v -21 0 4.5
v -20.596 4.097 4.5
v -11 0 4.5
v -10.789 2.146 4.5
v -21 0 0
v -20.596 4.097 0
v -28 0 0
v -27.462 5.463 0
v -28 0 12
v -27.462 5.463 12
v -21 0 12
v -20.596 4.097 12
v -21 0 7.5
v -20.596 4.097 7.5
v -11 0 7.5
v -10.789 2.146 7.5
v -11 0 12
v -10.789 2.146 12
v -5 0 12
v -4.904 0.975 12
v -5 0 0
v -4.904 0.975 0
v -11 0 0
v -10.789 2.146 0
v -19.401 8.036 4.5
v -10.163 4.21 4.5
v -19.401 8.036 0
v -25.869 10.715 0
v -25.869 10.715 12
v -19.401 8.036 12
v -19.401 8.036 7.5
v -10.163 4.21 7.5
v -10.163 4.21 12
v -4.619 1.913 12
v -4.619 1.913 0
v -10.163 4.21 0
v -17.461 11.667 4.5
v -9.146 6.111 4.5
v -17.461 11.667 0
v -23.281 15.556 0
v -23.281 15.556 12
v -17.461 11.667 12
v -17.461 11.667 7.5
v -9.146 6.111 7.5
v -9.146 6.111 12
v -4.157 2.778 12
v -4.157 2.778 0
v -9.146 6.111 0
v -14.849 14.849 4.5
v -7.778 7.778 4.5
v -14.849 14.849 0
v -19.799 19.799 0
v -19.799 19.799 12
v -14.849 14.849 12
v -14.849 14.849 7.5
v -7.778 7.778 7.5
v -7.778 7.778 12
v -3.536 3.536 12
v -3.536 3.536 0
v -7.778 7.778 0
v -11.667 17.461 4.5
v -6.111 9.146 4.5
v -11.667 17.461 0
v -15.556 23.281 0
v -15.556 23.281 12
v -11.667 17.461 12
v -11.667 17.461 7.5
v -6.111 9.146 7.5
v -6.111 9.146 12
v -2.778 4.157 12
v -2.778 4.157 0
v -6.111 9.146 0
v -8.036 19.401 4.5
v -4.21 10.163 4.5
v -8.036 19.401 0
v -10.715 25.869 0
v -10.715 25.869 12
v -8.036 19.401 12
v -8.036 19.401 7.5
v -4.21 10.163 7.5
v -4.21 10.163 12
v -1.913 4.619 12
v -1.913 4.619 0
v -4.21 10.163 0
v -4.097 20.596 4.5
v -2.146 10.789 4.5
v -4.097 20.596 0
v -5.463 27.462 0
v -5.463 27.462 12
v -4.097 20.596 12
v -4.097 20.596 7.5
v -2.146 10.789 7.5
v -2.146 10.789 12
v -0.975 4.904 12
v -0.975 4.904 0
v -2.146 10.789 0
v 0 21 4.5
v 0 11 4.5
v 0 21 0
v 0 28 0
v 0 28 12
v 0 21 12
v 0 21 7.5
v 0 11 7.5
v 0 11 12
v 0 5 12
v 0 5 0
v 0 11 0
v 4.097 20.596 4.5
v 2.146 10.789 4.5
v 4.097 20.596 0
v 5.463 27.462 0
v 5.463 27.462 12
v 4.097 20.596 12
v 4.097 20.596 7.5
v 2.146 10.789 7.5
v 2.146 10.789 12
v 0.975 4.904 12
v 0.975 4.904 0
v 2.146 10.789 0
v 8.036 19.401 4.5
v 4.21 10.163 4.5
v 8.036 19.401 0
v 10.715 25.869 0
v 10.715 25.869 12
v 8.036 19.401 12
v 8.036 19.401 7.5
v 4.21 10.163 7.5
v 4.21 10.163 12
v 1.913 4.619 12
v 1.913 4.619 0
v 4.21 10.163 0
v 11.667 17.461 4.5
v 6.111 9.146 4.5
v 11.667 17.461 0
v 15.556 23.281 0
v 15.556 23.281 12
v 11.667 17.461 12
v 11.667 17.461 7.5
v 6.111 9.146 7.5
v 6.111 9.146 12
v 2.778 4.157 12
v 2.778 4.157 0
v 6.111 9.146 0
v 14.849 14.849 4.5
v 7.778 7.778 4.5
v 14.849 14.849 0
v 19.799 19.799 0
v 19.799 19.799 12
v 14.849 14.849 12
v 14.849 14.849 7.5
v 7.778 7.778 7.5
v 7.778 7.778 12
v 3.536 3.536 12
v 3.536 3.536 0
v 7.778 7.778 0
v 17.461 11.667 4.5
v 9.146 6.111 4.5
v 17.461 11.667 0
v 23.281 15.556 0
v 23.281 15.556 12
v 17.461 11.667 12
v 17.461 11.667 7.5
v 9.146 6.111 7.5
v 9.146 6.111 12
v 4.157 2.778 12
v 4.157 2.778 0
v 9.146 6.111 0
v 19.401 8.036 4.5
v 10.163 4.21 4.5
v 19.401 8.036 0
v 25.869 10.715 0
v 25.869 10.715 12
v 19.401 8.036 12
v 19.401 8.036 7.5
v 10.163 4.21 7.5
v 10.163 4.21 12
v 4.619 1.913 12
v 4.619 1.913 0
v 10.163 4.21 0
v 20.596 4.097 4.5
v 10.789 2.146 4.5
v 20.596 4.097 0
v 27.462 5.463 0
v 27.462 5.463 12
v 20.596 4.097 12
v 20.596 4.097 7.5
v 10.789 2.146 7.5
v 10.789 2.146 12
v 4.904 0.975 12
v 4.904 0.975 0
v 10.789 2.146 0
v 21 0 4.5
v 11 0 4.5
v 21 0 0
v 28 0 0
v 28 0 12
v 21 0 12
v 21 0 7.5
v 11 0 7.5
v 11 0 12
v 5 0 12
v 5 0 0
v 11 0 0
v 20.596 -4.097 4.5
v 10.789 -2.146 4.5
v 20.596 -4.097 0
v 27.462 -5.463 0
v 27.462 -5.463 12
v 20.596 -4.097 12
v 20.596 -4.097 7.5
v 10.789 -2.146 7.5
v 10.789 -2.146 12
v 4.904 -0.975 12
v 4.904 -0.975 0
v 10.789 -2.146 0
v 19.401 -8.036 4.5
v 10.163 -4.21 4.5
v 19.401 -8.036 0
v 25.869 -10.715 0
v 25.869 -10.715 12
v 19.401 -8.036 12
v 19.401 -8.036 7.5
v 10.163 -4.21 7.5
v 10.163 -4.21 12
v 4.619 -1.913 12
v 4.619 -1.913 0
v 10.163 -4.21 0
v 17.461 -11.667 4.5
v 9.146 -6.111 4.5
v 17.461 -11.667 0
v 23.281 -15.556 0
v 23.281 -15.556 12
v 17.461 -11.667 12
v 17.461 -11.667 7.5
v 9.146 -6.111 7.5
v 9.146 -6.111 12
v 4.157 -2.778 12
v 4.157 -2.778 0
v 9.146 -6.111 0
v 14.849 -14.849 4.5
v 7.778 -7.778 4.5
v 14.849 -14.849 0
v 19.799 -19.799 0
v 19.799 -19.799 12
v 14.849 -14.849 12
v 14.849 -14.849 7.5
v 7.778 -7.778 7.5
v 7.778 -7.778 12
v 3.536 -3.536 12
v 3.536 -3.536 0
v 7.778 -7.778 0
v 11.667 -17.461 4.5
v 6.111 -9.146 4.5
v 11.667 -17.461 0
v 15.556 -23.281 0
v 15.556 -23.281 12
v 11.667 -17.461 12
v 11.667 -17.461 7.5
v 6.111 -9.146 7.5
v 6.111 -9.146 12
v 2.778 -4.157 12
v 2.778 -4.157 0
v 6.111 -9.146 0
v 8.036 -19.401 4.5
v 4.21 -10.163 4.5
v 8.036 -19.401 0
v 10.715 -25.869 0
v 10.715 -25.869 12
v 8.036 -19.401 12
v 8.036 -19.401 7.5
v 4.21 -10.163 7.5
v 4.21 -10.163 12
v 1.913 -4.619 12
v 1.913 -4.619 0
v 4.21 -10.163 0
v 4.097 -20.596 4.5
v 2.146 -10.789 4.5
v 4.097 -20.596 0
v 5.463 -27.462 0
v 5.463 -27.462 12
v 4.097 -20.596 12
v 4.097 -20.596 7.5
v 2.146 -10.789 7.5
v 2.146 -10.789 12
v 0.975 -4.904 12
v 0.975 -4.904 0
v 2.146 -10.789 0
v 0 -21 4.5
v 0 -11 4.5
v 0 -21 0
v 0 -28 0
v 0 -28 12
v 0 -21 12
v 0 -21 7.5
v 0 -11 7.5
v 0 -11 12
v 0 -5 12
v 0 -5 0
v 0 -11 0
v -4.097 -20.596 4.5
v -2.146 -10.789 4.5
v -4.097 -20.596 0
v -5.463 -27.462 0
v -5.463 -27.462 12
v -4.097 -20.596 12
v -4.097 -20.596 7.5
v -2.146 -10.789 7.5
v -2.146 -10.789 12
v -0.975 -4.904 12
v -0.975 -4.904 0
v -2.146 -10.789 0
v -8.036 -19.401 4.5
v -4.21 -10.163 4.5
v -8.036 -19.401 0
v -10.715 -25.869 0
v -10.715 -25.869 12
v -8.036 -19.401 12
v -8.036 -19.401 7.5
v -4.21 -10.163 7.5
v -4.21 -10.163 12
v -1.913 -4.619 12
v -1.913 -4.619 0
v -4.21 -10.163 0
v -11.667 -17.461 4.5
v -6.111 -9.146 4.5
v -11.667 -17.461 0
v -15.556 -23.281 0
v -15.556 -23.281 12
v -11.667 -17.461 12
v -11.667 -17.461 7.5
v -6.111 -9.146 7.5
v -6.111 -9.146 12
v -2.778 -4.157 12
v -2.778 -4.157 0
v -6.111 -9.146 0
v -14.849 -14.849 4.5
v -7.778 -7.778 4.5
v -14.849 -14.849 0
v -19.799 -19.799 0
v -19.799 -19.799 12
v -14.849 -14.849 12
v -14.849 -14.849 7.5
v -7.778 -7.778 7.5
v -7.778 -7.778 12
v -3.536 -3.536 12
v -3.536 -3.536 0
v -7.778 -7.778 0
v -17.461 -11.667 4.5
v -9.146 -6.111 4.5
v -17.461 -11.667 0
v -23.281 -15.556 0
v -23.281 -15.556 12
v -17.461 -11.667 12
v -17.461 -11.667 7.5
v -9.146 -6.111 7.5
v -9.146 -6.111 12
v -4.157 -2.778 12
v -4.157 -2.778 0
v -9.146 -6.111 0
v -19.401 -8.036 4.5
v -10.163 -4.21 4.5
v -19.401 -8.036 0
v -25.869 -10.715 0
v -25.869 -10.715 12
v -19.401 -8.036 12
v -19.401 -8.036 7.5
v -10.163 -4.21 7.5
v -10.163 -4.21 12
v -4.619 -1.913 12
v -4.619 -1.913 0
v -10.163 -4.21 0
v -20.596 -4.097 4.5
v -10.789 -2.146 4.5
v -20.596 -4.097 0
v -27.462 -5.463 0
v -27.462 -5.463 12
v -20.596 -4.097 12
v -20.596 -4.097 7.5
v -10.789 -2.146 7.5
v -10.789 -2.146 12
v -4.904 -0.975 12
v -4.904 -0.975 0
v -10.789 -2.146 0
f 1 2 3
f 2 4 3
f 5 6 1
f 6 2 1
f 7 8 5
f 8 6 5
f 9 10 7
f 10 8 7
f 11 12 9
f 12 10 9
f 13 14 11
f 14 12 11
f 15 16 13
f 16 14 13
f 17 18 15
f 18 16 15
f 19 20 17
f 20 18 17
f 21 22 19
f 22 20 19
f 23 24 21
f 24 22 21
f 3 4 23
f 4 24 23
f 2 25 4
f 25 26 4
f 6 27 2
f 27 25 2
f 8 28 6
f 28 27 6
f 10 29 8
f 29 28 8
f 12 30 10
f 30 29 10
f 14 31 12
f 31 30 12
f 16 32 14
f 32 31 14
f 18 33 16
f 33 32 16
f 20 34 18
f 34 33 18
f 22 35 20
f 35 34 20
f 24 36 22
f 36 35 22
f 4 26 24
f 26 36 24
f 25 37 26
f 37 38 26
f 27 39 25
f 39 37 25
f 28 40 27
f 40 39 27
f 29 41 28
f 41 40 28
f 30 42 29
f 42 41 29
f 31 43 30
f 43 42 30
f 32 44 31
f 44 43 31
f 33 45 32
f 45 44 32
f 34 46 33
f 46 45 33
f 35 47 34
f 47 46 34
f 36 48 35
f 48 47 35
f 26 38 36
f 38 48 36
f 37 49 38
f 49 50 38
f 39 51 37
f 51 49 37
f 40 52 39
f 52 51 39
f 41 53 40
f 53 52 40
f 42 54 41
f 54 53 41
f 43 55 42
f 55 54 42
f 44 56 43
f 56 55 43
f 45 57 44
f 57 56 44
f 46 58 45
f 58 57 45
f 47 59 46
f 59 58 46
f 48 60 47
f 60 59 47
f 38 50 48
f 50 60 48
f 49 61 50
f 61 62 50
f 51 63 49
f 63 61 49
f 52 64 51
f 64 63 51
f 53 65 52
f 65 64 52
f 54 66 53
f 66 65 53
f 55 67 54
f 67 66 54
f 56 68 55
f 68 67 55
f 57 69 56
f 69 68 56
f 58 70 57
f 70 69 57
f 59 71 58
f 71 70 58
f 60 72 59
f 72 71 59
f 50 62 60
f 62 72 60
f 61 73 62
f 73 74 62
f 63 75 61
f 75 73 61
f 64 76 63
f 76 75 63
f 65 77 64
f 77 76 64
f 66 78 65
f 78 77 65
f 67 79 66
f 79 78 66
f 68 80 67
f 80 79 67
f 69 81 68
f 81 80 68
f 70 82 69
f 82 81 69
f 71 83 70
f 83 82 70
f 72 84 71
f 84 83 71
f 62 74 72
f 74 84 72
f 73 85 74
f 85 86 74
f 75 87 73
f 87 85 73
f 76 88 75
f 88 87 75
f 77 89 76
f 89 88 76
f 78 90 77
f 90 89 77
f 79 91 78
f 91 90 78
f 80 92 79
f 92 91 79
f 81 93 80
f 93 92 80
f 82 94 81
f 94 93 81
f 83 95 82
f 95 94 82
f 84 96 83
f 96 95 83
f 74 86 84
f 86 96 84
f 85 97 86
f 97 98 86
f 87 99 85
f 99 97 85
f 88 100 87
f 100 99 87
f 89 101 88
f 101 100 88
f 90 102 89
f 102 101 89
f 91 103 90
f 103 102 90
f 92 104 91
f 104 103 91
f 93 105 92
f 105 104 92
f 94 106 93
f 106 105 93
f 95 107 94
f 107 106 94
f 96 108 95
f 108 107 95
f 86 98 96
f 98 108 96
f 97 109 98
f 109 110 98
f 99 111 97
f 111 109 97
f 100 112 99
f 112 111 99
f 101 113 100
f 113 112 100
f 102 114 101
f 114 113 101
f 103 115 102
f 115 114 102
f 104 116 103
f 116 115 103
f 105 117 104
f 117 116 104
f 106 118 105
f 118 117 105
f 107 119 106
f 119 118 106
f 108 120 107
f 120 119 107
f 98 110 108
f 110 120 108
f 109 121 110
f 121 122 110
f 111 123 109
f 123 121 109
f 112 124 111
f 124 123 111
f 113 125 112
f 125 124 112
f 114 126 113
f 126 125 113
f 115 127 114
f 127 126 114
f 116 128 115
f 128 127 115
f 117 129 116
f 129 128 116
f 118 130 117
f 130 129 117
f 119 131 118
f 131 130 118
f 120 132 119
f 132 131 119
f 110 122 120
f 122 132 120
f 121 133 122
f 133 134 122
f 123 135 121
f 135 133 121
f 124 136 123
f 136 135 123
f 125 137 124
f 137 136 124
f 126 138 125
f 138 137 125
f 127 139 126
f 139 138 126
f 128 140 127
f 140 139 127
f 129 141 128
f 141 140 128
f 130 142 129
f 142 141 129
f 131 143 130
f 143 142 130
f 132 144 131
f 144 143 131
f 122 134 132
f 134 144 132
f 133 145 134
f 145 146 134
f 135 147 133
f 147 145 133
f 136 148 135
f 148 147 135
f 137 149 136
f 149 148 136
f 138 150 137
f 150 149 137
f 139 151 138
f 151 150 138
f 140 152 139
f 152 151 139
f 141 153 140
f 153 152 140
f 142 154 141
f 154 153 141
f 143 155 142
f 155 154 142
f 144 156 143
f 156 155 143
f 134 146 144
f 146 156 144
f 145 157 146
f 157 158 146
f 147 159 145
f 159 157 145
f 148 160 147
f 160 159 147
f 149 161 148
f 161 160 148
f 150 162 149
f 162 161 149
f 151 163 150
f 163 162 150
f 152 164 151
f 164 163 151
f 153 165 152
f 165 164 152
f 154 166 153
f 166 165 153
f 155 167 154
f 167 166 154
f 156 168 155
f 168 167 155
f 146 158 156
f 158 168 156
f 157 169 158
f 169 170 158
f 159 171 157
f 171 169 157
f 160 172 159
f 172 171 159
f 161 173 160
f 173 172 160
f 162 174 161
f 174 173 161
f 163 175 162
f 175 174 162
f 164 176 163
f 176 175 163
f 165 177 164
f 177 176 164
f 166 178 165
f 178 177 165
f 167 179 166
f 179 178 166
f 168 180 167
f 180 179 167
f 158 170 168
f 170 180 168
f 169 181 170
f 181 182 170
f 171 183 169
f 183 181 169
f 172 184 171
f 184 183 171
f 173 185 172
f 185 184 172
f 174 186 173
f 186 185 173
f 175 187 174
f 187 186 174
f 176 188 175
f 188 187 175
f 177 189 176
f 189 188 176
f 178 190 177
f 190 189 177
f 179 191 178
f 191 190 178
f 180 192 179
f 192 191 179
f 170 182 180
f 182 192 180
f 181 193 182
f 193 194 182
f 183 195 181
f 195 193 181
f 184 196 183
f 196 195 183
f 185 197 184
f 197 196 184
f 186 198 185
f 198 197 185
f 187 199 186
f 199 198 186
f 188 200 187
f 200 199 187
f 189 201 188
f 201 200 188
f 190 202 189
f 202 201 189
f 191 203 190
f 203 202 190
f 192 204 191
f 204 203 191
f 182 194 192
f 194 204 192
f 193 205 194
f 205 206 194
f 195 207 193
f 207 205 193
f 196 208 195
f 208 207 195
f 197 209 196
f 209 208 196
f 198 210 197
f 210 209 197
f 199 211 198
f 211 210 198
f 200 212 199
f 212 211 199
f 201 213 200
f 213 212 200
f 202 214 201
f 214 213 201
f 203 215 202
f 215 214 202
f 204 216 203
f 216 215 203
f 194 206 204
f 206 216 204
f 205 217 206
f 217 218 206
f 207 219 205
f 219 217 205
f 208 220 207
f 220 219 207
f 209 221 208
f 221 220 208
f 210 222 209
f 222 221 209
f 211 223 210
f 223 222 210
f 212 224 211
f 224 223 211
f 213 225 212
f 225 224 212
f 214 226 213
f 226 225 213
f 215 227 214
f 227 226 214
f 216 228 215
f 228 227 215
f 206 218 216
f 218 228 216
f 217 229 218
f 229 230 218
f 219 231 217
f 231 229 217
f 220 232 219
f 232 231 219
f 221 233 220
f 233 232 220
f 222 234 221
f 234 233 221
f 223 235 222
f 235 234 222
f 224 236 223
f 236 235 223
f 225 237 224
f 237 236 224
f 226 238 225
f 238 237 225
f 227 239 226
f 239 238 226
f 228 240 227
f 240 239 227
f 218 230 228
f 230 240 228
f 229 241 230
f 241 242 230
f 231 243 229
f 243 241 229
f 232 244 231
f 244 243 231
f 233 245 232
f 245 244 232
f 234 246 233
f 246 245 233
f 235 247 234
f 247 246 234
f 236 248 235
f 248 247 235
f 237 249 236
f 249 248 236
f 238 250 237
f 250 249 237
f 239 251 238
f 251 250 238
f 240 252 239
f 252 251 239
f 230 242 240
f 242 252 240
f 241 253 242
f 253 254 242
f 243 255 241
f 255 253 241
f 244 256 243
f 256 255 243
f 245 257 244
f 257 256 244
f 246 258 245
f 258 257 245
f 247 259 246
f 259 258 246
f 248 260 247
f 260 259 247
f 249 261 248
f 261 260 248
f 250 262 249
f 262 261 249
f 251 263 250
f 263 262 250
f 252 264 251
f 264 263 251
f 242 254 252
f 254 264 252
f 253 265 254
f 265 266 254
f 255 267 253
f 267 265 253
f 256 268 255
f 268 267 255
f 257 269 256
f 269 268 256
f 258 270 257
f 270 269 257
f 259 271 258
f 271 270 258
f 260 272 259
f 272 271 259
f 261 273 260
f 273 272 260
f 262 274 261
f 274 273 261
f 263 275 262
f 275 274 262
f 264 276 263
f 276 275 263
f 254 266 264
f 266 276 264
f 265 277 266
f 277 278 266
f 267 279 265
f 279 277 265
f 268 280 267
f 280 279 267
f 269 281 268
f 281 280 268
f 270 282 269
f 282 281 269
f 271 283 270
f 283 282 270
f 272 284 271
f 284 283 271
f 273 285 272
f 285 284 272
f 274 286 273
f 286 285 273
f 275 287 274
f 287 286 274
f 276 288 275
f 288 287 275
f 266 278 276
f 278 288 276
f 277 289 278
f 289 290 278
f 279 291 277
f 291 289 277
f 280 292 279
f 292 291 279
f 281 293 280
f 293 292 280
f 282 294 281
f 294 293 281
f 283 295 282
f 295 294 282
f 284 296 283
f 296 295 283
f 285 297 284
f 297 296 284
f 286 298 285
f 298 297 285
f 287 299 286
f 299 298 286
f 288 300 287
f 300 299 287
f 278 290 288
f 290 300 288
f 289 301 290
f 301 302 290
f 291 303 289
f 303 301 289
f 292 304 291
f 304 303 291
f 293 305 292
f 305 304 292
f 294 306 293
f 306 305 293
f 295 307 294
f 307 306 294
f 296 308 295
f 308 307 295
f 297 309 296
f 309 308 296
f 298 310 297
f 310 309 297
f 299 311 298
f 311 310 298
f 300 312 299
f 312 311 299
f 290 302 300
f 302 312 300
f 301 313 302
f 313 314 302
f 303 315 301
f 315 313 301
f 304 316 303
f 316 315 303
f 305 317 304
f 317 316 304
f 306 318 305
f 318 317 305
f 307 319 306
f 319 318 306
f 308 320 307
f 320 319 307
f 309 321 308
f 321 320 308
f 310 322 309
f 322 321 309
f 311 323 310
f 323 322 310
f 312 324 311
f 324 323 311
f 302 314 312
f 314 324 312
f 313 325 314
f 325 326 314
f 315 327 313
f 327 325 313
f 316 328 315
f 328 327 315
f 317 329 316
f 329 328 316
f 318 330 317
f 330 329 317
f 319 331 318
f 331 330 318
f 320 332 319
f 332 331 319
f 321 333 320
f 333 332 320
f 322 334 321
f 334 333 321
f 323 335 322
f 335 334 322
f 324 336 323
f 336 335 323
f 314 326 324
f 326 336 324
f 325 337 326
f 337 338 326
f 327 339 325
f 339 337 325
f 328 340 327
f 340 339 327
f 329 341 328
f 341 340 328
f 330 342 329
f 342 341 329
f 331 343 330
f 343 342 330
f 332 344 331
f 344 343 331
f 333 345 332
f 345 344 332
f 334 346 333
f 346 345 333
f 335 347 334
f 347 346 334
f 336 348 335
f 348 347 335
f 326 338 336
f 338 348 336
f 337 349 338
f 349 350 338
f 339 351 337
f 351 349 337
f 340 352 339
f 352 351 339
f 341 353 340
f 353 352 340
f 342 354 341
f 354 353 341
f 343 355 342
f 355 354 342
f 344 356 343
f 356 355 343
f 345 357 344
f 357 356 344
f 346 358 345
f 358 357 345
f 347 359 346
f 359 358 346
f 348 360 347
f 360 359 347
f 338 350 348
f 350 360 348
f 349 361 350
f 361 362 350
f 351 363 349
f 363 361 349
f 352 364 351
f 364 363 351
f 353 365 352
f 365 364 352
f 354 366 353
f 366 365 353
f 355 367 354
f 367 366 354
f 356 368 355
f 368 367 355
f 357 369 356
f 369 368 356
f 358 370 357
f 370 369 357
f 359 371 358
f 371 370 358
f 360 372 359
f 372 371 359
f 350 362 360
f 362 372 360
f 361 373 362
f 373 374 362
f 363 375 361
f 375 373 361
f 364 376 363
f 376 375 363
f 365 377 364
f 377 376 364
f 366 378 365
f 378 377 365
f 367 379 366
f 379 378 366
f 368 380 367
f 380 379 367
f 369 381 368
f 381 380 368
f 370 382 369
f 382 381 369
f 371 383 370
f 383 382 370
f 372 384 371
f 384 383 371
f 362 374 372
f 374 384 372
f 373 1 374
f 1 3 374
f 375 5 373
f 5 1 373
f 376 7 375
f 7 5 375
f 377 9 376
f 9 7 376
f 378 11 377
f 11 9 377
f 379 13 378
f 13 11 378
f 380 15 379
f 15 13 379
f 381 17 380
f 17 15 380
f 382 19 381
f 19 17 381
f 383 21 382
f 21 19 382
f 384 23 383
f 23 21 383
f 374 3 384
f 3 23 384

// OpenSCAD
$fn = 32;

// ----------------------------------------------------------------------
// Revolved part: handwheel R28
// ----------------------------------------------------------------------

// --- parameters (mm) ---
bore_r = 5;               // bore radius
rim_r = 28;               // rim radius
rim_w = 7;                // rim axial width
rim_t = 12;               // rim diameter height
hub_r = 11;               // hub radius
web_t = 3;                // web thickness
revolve_angle = 360;      // revolve sweep, degrees

bore_d = 2 * bore_r;
rim_d = 2 * rim_r;
hub_d = 2 * hub_r;

profile = [[5, 0], [11, 0], [11, 4.5], [21, 4.5], [21, 0], [28, 0], [28, 12], [21, 12], [21, 7.5], [11, 7.5], [11, 12], [5, 12]];  // primary outline, 12 points, counter clockwise

// --- the one profile operation ---
rotate_extrude(angle = revolve_angle) polygon(points = profile);
